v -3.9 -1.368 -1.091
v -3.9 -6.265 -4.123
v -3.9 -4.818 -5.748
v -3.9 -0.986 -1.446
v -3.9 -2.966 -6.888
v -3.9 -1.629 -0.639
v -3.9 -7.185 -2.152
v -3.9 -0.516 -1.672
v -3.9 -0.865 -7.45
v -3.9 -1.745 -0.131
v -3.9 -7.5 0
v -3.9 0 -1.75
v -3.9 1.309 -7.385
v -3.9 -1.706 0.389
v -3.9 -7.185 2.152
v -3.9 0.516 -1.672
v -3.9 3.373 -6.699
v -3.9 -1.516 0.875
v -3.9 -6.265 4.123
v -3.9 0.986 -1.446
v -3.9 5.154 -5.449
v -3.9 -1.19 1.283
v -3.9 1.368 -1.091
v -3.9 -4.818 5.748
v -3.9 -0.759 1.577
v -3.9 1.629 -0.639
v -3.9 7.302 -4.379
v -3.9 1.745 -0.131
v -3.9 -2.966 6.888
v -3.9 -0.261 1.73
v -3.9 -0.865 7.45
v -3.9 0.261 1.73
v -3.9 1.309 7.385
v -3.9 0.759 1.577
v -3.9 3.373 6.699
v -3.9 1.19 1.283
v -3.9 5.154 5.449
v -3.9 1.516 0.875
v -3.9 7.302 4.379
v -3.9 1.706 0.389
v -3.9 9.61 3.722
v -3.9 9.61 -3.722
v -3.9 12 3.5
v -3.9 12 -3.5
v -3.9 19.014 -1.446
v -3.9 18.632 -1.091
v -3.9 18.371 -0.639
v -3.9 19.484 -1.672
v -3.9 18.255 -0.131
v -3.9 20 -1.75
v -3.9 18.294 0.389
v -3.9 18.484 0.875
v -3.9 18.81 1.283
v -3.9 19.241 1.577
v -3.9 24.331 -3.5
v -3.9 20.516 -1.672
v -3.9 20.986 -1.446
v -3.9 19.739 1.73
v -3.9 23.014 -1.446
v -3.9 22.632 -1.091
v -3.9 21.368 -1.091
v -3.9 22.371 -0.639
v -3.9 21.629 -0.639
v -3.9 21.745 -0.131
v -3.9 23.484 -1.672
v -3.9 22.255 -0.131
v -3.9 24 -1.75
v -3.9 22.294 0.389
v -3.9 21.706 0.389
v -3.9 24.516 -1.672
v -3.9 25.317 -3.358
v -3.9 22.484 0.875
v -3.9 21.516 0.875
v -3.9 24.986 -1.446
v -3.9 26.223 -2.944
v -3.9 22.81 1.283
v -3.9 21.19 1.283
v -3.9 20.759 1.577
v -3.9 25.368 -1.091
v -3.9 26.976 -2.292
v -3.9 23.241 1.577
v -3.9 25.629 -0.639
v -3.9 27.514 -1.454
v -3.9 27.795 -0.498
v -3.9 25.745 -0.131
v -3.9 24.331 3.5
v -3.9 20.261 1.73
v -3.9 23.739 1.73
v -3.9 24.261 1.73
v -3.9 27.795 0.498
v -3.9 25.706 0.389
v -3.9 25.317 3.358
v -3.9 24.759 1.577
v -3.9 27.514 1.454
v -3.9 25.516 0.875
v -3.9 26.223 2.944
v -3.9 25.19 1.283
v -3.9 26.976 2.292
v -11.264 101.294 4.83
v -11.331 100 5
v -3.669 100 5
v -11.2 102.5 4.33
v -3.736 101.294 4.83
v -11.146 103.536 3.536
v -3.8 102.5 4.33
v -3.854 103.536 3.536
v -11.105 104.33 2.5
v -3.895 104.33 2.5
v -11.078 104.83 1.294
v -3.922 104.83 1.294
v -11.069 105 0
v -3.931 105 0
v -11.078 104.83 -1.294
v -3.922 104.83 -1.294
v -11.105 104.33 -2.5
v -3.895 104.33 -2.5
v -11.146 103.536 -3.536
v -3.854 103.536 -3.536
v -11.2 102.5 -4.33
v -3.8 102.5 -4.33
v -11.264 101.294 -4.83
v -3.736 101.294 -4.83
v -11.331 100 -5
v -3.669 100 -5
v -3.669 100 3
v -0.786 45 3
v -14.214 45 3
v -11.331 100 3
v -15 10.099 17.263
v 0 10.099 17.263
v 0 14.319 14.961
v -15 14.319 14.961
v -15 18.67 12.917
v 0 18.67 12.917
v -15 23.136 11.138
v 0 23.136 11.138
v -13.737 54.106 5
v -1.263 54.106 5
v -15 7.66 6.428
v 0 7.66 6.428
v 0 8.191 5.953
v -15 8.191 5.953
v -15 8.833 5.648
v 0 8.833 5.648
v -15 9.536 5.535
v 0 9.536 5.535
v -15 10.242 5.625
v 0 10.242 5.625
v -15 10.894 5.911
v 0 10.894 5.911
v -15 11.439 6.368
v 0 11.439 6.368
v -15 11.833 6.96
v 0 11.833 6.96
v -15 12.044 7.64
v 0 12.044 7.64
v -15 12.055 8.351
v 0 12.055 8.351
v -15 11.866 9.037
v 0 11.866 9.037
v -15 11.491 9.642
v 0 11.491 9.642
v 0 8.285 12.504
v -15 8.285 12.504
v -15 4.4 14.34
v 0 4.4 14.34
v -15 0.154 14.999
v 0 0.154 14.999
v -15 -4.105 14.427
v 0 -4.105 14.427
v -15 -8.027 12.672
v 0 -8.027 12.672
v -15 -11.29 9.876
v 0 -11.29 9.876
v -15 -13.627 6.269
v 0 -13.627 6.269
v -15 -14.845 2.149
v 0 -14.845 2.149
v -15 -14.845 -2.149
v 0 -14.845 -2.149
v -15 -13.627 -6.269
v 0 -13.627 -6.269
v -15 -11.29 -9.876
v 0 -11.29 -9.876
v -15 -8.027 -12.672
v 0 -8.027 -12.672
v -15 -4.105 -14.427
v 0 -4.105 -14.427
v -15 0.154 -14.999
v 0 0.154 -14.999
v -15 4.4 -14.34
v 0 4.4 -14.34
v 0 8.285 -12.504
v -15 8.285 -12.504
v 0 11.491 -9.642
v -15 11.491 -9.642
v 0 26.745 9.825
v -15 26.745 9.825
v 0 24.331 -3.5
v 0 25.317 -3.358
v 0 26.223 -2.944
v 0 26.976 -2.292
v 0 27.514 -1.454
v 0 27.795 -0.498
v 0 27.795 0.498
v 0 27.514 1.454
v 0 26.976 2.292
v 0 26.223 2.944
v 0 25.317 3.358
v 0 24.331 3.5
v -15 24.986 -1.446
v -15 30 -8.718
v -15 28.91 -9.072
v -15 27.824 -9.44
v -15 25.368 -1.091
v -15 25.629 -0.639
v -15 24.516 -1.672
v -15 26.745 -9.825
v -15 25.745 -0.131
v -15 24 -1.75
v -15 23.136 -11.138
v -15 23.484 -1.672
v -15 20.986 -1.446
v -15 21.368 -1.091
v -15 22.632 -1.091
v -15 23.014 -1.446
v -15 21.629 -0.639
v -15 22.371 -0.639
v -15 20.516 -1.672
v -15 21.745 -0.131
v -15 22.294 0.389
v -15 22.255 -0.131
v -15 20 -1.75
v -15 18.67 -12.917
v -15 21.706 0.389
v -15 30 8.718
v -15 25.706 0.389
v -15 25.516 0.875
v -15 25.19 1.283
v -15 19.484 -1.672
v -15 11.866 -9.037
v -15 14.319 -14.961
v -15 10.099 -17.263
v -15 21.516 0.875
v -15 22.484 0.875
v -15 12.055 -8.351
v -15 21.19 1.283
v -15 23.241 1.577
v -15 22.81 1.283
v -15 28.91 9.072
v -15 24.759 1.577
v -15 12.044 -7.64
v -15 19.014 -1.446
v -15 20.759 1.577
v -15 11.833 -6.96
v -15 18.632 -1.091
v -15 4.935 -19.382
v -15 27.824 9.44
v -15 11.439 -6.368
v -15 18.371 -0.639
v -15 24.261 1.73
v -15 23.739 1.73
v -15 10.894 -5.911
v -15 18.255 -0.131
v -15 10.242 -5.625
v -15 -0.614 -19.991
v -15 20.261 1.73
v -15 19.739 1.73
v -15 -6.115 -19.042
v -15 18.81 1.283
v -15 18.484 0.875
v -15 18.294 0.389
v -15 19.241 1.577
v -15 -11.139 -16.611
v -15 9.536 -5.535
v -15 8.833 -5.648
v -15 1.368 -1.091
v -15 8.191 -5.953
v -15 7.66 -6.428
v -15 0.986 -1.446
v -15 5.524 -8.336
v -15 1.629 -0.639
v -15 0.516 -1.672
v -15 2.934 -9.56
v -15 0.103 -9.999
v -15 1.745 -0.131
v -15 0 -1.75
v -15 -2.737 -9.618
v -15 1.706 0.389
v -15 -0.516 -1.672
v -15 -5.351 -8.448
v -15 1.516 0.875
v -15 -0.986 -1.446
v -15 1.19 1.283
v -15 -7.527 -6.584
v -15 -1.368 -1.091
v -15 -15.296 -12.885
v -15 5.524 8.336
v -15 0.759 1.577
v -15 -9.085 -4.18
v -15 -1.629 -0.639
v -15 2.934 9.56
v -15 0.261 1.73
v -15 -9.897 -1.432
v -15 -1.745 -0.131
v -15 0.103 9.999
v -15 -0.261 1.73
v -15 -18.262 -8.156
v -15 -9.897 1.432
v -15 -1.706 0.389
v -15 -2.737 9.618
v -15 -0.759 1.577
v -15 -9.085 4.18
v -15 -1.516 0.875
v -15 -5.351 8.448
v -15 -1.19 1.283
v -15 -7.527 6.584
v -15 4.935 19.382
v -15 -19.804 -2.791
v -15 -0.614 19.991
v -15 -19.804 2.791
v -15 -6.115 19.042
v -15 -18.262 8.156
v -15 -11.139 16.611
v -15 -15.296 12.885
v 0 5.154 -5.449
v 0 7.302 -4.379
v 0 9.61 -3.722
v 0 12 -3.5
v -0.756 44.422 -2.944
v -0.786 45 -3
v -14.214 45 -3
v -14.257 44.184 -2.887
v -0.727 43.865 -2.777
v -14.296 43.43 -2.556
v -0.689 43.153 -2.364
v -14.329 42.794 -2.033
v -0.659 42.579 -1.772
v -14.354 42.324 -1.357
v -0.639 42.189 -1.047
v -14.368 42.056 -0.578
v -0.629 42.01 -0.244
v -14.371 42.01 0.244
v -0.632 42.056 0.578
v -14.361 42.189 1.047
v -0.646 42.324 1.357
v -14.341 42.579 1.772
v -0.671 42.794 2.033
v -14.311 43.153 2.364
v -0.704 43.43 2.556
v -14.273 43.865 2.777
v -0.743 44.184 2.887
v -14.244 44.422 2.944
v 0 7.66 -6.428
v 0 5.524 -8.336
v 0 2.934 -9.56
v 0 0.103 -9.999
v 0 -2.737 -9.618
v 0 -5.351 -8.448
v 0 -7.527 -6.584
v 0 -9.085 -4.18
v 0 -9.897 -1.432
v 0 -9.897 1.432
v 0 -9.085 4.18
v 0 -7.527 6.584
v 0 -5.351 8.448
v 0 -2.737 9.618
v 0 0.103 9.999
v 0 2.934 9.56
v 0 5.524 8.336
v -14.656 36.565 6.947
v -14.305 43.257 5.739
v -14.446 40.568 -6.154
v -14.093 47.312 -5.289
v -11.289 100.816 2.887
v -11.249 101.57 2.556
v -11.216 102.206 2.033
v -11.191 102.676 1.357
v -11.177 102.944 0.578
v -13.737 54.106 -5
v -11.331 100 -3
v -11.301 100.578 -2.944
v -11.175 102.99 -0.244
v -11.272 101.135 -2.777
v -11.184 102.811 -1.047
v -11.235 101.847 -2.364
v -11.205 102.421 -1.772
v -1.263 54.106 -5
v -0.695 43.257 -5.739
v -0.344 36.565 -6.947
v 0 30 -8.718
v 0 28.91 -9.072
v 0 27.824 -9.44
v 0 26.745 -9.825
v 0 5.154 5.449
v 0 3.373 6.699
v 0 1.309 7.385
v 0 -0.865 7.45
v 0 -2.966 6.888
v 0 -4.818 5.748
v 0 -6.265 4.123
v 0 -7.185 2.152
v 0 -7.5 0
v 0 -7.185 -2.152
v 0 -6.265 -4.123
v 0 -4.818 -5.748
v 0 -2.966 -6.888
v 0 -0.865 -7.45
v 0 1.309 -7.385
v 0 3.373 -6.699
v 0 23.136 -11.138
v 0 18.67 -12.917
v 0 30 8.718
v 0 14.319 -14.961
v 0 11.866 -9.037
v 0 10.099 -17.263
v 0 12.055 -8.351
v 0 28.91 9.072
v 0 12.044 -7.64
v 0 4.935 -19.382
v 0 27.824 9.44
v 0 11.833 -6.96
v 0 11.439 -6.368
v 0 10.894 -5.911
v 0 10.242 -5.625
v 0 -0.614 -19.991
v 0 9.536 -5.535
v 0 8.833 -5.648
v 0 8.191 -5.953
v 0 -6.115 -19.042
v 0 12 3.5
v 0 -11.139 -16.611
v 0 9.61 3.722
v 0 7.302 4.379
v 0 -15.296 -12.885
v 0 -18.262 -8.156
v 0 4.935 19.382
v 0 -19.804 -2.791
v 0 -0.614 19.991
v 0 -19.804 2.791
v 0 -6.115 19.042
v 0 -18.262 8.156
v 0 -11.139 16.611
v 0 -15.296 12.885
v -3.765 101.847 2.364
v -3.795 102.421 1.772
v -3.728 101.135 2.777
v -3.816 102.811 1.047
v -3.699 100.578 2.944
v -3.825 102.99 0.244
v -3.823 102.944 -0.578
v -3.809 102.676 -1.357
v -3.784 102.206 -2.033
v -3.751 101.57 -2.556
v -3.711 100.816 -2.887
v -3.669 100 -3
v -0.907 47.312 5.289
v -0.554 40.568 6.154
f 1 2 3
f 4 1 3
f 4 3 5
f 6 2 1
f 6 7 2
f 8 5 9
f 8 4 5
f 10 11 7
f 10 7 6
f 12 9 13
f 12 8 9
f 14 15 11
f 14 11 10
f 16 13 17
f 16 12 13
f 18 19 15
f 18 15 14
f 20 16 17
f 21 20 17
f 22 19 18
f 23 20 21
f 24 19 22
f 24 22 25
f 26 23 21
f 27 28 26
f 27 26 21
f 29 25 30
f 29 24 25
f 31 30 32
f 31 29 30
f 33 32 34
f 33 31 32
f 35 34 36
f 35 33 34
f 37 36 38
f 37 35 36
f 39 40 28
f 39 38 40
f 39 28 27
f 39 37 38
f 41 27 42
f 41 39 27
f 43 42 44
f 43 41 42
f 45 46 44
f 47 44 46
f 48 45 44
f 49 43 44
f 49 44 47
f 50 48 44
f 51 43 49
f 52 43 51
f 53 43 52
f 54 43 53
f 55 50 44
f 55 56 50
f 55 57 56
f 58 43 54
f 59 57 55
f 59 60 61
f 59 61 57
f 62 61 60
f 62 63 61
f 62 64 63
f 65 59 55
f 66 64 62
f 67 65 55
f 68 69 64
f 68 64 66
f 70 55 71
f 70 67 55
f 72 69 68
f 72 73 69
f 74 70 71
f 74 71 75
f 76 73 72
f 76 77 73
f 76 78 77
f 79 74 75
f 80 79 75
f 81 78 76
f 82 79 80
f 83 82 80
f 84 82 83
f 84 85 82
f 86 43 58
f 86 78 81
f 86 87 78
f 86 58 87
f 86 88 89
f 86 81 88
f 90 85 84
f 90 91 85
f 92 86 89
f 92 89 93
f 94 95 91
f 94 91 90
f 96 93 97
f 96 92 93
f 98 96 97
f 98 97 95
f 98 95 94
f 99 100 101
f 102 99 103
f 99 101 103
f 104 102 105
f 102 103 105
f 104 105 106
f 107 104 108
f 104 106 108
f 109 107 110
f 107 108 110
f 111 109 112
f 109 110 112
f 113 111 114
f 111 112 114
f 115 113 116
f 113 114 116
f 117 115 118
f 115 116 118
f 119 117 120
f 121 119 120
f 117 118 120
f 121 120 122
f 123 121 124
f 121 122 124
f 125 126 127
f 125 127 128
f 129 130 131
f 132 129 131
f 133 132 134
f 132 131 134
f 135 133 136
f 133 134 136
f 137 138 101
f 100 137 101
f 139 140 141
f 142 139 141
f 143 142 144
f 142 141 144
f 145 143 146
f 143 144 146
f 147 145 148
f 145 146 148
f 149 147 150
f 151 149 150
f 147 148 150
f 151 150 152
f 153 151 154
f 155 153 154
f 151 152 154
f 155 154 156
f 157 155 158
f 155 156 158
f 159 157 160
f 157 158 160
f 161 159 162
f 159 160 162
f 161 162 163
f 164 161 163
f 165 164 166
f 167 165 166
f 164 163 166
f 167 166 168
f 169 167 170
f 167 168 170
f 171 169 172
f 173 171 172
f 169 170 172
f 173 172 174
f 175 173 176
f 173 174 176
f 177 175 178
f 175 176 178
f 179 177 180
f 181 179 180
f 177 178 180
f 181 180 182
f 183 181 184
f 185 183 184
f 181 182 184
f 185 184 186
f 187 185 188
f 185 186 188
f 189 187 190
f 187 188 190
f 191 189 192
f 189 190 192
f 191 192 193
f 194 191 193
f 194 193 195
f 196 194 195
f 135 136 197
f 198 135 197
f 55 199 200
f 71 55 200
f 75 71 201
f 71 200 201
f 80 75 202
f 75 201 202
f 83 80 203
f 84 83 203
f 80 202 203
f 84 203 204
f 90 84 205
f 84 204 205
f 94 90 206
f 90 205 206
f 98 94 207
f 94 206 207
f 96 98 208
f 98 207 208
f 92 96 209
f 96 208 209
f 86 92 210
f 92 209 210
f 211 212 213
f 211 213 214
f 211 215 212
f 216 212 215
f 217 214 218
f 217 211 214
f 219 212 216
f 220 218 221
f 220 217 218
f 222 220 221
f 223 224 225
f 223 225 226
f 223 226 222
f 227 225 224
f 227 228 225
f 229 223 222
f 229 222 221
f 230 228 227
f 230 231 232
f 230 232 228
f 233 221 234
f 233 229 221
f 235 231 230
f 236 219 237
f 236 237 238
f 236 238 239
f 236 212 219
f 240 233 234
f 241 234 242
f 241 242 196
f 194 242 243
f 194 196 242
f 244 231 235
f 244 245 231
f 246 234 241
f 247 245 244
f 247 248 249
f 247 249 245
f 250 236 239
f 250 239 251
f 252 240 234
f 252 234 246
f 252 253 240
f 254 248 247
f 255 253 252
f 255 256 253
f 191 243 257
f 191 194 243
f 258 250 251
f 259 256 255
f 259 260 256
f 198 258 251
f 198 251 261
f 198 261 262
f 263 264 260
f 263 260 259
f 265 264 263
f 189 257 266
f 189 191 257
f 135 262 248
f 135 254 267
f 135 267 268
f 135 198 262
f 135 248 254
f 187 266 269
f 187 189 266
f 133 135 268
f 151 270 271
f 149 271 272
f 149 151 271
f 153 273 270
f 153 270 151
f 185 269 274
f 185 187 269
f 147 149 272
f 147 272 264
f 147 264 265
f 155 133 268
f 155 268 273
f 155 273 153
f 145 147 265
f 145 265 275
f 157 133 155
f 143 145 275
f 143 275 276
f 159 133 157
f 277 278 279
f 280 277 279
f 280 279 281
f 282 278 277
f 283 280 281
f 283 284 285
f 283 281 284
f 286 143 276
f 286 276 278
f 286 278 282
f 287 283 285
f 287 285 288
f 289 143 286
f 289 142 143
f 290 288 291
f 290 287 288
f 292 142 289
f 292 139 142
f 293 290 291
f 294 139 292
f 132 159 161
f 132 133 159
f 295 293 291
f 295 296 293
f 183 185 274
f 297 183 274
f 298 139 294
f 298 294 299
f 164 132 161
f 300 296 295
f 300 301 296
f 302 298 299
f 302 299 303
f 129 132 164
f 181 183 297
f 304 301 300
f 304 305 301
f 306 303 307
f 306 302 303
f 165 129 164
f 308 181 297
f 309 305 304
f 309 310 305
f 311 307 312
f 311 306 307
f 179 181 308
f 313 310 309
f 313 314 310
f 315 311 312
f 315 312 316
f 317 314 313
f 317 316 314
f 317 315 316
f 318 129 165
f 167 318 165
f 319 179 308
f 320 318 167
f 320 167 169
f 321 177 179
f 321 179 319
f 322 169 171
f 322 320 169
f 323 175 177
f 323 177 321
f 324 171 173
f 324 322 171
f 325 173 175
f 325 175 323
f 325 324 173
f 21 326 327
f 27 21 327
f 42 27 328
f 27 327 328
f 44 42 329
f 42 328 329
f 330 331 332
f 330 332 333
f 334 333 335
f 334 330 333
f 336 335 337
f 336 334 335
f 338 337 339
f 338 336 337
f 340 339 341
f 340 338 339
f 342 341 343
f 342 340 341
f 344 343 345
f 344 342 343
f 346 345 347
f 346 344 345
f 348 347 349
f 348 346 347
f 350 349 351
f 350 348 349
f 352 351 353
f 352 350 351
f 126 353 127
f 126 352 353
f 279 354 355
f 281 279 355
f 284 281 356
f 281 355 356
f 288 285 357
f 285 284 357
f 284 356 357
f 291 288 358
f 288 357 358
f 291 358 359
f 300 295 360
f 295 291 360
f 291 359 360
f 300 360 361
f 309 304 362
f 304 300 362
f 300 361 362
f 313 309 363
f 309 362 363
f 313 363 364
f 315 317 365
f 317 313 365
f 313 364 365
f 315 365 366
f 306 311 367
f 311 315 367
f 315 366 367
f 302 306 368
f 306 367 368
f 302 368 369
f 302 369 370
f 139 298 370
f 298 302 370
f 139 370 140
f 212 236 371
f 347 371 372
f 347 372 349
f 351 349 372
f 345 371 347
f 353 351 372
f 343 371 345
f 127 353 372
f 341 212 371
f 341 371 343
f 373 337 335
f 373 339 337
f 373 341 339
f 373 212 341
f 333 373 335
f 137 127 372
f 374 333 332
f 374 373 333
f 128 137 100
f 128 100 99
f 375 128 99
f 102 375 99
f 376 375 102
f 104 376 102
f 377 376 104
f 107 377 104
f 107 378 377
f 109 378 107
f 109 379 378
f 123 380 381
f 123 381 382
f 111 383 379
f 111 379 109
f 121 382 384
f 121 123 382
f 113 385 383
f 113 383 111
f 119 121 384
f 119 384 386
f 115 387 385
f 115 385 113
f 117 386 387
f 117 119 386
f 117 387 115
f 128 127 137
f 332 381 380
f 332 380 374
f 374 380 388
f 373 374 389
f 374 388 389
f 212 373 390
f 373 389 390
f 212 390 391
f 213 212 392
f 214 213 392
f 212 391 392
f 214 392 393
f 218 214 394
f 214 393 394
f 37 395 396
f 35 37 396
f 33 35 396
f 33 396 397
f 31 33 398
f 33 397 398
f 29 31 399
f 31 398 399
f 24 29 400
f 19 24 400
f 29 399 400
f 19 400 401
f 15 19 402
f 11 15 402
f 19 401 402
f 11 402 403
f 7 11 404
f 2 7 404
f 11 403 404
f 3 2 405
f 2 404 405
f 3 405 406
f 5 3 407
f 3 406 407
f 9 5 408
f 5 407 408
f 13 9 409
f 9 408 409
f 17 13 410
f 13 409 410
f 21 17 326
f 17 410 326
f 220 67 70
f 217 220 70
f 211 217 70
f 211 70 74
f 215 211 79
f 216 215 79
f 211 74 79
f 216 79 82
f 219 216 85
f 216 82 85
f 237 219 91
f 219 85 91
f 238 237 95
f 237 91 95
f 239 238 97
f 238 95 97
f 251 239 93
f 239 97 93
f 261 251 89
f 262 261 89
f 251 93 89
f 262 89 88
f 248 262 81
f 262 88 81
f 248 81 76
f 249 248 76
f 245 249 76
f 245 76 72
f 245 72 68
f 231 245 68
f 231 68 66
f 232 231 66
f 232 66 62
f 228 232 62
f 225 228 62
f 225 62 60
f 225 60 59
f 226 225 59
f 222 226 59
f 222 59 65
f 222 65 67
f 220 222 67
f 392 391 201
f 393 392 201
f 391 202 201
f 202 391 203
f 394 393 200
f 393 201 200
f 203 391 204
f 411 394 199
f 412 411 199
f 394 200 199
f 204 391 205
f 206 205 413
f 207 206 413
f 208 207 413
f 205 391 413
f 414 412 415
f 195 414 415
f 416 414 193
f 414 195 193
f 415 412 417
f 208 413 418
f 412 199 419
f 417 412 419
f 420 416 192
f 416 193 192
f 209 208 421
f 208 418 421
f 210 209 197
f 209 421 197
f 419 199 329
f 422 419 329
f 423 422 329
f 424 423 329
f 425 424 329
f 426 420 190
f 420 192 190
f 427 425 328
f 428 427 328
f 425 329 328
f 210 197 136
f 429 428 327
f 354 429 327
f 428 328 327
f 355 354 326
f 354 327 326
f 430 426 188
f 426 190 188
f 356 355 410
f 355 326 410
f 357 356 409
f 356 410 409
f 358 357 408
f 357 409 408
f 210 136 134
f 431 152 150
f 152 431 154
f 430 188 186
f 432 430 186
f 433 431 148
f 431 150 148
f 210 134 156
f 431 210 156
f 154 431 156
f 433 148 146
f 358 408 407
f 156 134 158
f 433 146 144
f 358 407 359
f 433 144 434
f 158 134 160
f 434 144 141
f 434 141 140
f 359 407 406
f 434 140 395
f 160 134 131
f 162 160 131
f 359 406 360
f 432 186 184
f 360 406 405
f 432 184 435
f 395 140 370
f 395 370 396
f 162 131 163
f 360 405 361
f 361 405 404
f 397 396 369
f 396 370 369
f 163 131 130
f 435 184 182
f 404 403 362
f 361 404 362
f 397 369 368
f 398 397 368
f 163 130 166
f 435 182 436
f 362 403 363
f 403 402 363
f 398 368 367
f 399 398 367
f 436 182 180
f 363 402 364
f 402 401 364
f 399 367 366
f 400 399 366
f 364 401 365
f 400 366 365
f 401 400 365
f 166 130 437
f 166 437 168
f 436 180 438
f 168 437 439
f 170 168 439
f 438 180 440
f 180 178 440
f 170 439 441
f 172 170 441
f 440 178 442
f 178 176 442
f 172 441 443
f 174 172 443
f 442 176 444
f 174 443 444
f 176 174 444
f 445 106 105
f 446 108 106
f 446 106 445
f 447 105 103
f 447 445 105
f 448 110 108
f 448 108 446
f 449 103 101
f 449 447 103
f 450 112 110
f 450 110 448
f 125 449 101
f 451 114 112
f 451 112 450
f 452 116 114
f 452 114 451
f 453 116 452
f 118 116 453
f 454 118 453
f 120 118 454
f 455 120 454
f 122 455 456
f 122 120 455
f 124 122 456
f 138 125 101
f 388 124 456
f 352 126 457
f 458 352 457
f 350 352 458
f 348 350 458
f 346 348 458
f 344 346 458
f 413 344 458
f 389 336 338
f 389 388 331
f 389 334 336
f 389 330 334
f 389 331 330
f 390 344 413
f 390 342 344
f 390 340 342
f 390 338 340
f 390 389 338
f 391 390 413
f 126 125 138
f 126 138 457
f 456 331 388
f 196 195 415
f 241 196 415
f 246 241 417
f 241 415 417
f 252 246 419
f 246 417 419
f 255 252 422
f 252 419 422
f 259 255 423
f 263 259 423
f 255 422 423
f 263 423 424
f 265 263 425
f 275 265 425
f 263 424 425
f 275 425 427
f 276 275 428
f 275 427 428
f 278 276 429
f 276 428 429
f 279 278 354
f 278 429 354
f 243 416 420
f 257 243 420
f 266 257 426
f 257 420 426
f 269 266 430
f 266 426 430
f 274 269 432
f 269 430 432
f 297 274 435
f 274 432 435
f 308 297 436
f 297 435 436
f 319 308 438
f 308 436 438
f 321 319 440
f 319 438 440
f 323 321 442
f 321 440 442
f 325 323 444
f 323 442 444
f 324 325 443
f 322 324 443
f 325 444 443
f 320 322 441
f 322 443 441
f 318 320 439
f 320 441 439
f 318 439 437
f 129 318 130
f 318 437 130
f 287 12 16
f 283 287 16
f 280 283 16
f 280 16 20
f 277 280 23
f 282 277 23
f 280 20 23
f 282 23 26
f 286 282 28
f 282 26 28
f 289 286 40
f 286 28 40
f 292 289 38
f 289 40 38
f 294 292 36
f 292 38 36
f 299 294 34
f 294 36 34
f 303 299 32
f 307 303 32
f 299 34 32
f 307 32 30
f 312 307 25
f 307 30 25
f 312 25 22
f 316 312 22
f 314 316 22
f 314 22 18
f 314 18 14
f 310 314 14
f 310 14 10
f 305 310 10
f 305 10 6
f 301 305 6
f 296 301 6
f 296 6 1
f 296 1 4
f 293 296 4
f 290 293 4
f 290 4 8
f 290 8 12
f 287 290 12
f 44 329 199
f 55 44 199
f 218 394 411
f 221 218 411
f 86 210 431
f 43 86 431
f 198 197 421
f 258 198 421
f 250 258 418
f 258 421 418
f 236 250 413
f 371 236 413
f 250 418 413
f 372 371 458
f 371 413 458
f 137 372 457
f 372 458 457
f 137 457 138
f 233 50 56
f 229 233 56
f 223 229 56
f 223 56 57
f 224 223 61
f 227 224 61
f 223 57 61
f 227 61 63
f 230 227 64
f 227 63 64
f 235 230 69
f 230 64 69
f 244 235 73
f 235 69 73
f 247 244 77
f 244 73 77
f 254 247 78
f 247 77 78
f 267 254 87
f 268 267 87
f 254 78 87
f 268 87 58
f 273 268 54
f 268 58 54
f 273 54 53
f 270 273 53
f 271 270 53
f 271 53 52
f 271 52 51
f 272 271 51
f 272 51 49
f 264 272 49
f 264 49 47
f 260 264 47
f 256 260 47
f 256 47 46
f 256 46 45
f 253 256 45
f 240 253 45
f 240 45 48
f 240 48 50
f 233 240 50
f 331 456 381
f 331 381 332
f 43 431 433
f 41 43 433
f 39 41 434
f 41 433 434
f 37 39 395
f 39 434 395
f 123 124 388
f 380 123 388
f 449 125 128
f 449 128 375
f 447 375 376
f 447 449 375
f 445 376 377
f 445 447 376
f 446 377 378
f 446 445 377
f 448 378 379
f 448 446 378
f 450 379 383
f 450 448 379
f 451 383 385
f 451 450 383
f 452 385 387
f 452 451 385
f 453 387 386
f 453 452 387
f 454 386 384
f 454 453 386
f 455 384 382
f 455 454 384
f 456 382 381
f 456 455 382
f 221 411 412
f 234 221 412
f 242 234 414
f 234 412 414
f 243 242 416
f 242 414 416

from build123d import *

# Parameters (mm, degrees)
BOSS_EXTRUDE1_DEPTH     = 15
CUT_EXTRUDE1_DEPTH      = 3.9
SKETCH4_R               = 1.75
CUT_EXTRUDE2_DEPTH      = 108.462598145
CUT_EXTRUDE3_DEPTH      = 108.935165725
CUT_EXTRUDE3_DEPTH_BACK = 108.935165725
CUT_EXTRUDE5_DEPTH      = 108.935165725


with BuildPart() as part:
    # Sketch2 → Boss-Extrude1 (new body)
    with BuildSketch(Plane.YZ):
        with BuildLine():
            Line((54.106158457, 5), (100, 5))
            ThreePointArc((100, 5), (105, 0), (100, -5))
            Line((100, -5), (54.106158457, -5))
            ThreePointArc((54.106158457, -5), (40.214304243, -6.215379759), (26.744546991, -9.824590337))
            Line((26.744546991, -9.824590337), (23.135674536, -11.13811249))
            ThreePointArc((23.135674536, -11.13811249), (16.479451078, -13.906430601), (10.0994572, -17.262704431))
            ThreePointArc((10.0994572, -17.262704431), (-20, 0), (10.0994572, 17.262704431))
            ThreePointArc((10.0994572, 17.262704431), (16.479451078, 13.906430601), (23.135674536, 11.13811249))
            Line((23.135674536, 11.13811249), (26.744546991, 9.824590337))
            ThreePointArc((26.744546991, 9.824590337), (40.214304243, 6.215379759), (54.106158457, 5))
        make_face()
        with BuildLine():
            Line((45, 3), (100, 3))
            ThreePointArc((100, 3), (103, 0), (100, -3))
            Line((100, -3), (45, -3))
            ThreePointArc((45, -3), (42, 0), (45, 3))
        make_face(mode=Mode.SUBTRACT)
    extrude(amount=-BOSS_EXTRUDE1_DEPTH)

    # Sketch3 → Cut-Extrude1 (cut)
    with BuildSketch(Plane.YZ):
        with BuildLine():
            Line((24.33053856, 3.5), (12, 3.5))
            ThreePointArc((12, 3.5), (8.440790603, 3.996719292), (5.153570125, 5.448918697))
            ThreePointArc((5.153570125, 5.448918697), (-7.5, 0), (5.153570125, -5.448918697))
            ThreePointArc((5.153570125, -5.448918697), (8.440790603, -3.996719292), (12, -3.5))
            Line((12, -3.5), (24.33053856, -3.5))
            ThreePointArc((24.33053856, -3.5), (27.83053856, 0), (24.33053856, 3.5))
        make_face()
    extrude(amount=-CUT_EXTRUDE1_DEPTH, mode=Mode.SUBTRACT)

    # Sketch4 → Cut-Extrude2 (cut, through all)
    with BuildSketch(Plane.YZ.offset(-3.9)):
        with Locations(Location((20, 0, 0), (0, 0, 270))):
            Circle(SKETCH4_R)
        with Locations(Location((24, 0, 0), (0, 0, 270))):
            Circle(SKETCH4_R)
        with Locations(Location((0, 0, 0), (0, 0, 270))):
            Circle(SKETCH4_R)
    extrude(amount=-CUT_EXTRUDE2_DEPTH, mode=Mode.SUBTRACT)

    # Sketch5 → Cut-Extrude3 (cut, two sides: drawn at the far end of the back side and taken through both)
    with BuildSketch(Plane(origin=(0, 0, 0), x_dir=(0, 1, 0), z_dir=(0, 0, 1)).offset(-CUT_EXTRUDE3_DEPTH_BACK)):
        Polygon((30, 15), (105, 11.069416554), (105, 15), align=None)
        Polygon((105, 0), (105, 3.930583446), (30, 0), align=None)
    extrude(amount=CUT_EXTRUDE3_DEPTH + CUT_EXTRUDE3_DEPTH_BACK, mode=Mode.SUBTRACT)

    # Sketch8 → Cut-Extrude5 (cut, through all)
    with BuildSketch(Plane.YZ):
        with BuildLine():
            ThreePointArc((11.490666647, 9.641814145), (-15, 0), (11.490666647, -9.641814145))
            ThreePointArc((11.490666647, -9.641814145), (11.182524563, -6.119734013), (7.660444431, -6.427876097))
            ThreePointArc((7.660444431, -6.427876097), (-10, 0), (7.660444431, 6.427876097))
            ThreePointArc((7.660444431, 6.427876097), (11.182524563, 6.119734013), (11.490666647, 9.641814145))
        make_face()
    extrude(amount=-CUT_EXTRUDE5_DEPTH, mode=Mode.SUBTRACT)


solid = part.part
